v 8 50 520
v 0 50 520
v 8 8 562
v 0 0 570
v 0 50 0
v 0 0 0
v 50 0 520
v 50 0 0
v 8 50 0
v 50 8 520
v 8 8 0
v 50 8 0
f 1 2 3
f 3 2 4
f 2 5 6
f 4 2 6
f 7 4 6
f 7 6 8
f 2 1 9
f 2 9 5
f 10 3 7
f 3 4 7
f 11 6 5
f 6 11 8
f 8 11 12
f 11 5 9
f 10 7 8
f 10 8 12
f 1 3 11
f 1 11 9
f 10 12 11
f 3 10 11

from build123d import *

# Parameters (mm, degrees)
F1_DEPTH = 570
F3_DEPTH = 8
F5_DEPTH = 8


with BuildPart() as f1:
    # F0 (on Top) → F1 (new body)
    with BuildSketch(Plane.XY):
        Polygon((0, 50), (0, 0), (50, 0), (50, 8), (8, 8), (8, 50), align=None)
    extrude(amount=F1_DEPTH)

    # F2 (on face) → F3 (cut, through all)
    with BuildSketch(Plane.XZ):
        Polygon((50, 570), (0, 570), (50, 520), align=None)
    extrude(amount=-F3_DEPTH, mode=Mode.SUBTRACT)

    # F4 (on face) → F5 (cut, through all)
    with BuildSketch(Plane(origin=(0, 0, 0), x_dir=(0, -1, 0), z_dir=(-1, 0, 0))):
        Polygon((-50, 520), (0, 570), (-8, 570), (-50, 570), align=None)
    extrude(amount=-F5_DEPTH, mode=Mode.SUBTRACT)


solid = f1.part
